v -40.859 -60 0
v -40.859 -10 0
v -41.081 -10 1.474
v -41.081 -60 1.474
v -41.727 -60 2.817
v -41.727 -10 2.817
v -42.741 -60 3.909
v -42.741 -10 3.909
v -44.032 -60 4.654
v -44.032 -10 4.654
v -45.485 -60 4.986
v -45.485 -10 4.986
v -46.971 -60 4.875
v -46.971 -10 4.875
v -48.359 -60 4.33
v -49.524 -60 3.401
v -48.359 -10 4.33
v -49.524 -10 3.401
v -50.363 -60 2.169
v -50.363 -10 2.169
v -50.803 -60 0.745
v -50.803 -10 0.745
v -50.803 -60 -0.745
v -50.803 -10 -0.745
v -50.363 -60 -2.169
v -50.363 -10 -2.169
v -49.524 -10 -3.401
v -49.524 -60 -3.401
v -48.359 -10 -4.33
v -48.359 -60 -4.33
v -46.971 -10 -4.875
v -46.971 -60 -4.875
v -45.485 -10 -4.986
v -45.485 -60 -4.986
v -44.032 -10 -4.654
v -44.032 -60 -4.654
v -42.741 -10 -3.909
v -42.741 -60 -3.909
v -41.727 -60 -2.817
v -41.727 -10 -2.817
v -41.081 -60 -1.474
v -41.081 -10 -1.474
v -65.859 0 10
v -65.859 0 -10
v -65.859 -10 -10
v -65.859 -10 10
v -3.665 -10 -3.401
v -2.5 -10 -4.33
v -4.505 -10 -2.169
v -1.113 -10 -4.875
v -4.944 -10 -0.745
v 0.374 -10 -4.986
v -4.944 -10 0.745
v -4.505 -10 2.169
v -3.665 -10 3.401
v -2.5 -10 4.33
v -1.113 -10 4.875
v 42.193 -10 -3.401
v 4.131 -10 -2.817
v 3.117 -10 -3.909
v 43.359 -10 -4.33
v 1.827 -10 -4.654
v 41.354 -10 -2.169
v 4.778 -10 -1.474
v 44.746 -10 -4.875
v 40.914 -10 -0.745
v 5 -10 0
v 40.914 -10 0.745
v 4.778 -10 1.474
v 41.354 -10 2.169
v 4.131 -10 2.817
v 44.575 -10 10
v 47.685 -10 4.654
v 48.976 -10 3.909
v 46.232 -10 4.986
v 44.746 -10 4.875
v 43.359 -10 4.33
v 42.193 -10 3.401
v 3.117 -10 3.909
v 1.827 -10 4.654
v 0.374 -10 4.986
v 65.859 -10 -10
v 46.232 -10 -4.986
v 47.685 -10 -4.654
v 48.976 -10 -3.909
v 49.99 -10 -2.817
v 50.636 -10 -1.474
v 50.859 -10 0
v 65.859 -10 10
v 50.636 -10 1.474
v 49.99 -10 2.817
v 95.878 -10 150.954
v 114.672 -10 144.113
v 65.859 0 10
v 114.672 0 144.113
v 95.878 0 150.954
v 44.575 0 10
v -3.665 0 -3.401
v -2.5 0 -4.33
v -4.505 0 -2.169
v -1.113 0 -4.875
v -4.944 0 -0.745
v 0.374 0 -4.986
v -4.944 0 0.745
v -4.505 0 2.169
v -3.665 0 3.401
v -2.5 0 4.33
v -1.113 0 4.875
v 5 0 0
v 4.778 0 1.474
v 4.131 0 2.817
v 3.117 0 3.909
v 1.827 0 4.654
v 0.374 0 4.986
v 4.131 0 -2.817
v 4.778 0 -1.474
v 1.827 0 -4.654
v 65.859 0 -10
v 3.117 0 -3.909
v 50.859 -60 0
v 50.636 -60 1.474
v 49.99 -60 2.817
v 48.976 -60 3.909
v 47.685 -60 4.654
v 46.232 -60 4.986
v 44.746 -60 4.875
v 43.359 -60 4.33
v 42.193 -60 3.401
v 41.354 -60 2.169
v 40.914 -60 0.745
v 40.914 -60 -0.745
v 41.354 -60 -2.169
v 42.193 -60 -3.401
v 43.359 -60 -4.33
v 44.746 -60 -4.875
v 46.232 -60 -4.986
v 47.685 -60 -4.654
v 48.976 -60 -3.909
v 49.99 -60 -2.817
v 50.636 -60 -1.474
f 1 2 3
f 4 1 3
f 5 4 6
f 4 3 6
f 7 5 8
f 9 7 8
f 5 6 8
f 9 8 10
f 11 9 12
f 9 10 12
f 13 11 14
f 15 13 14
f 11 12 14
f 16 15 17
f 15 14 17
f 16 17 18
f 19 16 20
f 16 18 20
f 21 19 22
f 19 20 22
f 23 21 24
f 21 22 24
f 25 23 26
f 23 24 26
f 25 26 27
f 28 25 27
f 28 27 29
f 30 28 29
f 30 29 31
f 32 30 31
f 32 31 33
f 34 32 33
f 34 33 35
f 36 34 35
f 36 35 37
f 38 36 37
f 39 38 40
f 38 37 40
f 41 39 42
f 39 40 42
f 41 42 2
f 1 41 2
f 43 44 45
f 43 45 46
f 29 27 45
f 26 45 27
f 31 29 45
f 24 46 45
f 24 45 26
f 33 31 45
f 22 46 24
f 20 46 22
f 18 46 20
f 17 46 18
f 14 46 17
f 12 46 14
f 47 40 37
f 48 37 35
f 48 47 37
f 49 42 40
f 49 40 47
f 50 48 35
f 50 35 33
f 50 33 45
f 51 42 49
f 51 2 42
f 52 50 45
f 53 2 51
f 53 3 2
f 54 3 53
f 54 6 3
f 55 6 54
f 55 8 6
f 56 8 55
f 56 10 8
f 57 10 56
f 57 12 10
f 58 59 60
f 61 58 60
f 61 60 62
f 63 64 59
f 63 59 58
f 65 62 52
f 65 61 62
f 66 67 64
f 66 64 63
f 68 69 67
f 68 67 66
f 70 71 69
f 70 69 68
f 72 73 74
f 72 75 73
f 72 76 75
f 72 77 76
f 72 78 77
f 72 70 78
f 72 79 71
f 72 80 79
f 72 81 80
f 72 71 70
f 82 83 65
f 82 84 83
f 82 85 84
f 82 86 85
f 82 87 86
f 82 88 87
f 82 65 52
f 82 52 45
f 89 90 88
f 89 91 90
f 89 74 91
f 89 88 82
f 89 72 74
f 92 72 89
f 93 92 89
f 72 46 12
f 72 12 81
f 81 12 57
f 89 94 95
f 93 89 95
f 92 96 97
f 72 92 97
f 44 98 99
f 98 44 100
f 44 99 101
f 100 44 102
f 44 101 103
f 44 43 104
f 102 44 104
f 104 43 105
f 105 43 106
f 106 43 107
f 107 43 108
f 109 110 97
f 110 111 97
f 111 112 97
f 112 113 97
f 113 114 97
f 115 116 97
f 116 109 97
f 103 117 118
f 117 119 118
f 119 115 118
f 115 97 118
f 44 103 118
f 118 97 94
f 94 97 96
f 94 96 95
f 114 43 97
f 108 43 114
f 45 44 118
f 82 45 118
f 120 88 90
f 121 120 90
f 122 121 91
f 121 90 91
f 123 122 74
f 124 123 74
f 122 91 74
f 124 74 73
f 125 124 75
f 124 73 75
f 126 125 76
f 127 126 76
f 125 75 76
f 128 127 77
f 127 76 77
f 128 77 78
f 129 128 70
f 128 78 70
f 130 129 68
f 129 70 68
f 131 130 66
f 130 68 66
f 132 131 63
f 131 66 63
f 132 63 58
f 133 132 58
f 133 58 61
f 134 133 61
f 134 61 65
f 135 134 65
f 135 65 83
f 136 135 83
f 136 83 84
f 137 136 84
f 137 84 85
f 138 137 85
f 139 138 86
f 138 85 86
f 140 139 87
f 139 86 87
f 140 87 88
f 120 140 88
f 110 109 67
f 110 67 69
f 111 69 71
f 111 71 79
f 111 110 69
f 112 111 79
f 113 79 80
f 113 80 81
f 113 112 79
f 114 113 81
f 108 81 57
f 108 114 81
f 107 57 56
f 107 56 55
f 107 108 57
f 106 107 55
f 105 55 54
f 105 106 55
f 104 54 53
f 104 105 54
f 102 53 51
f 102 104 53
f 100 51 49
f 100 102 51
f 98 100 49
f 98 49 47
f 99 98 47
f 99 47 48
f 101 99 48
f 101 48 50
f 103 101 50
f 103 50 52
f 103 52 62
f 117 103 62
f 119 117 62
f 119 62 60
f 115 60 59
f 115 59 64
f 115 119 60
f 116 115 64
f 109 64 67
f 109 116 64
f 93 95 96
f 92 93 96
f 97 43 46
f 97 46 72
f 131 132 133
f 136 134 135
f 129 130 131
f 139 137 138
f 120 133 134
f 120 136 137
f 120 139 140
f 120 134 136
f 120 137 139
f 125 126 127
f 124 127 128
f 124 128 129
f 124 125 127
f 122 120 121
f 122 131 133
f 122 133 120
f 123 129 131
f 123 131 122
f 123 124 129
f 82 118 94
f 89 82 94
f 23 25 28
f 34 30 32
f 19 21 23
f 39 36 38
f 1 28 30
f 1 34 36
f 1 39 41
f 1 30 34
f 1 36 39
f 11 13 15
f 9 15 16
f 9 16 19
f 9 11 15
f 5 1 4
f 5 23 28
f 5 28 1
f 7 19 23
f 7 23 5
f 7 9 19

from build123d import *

# Parameters (mm, degrees)
F0_W     = 131.7172
F0_H     = 20
F0_R     = 5
F1_DEPTH = 10
F2_R     = 5
F3_DEPTH = 50
F5_DEPTH = 10


with BuildPart() as f1:
    # F0 (on Front) → F1 (new body)
    with BuildSketch(Plane.XZ):
        Rectangle(F0_W, F0_H)
        Circle(F0_R, mode=Mode.SUBTRACT)
    extrude(amount=F1_DEPTH)

    # F2 (on face) → F3 (join)
    with BuildSketch(Plane.XZ.offset(10)):
        with Locations((-45.8586, 0)):
            Circle(F2_R)
        with Locations((45.8586, 0)):
            Circle(F2_R)
    extrude(amount=F3_DEPTH)

    # F4 (on Front) → F5 (join)
    with BuildSketch(Plane.XZ):
        Polygon((95.878066, 150.953893), (44.575044, 10), (63.368897, 3.159597), (114.671918, 144.11349), align=None)
    extrude(amount=F5_DEPTH)


solid = f1.part
